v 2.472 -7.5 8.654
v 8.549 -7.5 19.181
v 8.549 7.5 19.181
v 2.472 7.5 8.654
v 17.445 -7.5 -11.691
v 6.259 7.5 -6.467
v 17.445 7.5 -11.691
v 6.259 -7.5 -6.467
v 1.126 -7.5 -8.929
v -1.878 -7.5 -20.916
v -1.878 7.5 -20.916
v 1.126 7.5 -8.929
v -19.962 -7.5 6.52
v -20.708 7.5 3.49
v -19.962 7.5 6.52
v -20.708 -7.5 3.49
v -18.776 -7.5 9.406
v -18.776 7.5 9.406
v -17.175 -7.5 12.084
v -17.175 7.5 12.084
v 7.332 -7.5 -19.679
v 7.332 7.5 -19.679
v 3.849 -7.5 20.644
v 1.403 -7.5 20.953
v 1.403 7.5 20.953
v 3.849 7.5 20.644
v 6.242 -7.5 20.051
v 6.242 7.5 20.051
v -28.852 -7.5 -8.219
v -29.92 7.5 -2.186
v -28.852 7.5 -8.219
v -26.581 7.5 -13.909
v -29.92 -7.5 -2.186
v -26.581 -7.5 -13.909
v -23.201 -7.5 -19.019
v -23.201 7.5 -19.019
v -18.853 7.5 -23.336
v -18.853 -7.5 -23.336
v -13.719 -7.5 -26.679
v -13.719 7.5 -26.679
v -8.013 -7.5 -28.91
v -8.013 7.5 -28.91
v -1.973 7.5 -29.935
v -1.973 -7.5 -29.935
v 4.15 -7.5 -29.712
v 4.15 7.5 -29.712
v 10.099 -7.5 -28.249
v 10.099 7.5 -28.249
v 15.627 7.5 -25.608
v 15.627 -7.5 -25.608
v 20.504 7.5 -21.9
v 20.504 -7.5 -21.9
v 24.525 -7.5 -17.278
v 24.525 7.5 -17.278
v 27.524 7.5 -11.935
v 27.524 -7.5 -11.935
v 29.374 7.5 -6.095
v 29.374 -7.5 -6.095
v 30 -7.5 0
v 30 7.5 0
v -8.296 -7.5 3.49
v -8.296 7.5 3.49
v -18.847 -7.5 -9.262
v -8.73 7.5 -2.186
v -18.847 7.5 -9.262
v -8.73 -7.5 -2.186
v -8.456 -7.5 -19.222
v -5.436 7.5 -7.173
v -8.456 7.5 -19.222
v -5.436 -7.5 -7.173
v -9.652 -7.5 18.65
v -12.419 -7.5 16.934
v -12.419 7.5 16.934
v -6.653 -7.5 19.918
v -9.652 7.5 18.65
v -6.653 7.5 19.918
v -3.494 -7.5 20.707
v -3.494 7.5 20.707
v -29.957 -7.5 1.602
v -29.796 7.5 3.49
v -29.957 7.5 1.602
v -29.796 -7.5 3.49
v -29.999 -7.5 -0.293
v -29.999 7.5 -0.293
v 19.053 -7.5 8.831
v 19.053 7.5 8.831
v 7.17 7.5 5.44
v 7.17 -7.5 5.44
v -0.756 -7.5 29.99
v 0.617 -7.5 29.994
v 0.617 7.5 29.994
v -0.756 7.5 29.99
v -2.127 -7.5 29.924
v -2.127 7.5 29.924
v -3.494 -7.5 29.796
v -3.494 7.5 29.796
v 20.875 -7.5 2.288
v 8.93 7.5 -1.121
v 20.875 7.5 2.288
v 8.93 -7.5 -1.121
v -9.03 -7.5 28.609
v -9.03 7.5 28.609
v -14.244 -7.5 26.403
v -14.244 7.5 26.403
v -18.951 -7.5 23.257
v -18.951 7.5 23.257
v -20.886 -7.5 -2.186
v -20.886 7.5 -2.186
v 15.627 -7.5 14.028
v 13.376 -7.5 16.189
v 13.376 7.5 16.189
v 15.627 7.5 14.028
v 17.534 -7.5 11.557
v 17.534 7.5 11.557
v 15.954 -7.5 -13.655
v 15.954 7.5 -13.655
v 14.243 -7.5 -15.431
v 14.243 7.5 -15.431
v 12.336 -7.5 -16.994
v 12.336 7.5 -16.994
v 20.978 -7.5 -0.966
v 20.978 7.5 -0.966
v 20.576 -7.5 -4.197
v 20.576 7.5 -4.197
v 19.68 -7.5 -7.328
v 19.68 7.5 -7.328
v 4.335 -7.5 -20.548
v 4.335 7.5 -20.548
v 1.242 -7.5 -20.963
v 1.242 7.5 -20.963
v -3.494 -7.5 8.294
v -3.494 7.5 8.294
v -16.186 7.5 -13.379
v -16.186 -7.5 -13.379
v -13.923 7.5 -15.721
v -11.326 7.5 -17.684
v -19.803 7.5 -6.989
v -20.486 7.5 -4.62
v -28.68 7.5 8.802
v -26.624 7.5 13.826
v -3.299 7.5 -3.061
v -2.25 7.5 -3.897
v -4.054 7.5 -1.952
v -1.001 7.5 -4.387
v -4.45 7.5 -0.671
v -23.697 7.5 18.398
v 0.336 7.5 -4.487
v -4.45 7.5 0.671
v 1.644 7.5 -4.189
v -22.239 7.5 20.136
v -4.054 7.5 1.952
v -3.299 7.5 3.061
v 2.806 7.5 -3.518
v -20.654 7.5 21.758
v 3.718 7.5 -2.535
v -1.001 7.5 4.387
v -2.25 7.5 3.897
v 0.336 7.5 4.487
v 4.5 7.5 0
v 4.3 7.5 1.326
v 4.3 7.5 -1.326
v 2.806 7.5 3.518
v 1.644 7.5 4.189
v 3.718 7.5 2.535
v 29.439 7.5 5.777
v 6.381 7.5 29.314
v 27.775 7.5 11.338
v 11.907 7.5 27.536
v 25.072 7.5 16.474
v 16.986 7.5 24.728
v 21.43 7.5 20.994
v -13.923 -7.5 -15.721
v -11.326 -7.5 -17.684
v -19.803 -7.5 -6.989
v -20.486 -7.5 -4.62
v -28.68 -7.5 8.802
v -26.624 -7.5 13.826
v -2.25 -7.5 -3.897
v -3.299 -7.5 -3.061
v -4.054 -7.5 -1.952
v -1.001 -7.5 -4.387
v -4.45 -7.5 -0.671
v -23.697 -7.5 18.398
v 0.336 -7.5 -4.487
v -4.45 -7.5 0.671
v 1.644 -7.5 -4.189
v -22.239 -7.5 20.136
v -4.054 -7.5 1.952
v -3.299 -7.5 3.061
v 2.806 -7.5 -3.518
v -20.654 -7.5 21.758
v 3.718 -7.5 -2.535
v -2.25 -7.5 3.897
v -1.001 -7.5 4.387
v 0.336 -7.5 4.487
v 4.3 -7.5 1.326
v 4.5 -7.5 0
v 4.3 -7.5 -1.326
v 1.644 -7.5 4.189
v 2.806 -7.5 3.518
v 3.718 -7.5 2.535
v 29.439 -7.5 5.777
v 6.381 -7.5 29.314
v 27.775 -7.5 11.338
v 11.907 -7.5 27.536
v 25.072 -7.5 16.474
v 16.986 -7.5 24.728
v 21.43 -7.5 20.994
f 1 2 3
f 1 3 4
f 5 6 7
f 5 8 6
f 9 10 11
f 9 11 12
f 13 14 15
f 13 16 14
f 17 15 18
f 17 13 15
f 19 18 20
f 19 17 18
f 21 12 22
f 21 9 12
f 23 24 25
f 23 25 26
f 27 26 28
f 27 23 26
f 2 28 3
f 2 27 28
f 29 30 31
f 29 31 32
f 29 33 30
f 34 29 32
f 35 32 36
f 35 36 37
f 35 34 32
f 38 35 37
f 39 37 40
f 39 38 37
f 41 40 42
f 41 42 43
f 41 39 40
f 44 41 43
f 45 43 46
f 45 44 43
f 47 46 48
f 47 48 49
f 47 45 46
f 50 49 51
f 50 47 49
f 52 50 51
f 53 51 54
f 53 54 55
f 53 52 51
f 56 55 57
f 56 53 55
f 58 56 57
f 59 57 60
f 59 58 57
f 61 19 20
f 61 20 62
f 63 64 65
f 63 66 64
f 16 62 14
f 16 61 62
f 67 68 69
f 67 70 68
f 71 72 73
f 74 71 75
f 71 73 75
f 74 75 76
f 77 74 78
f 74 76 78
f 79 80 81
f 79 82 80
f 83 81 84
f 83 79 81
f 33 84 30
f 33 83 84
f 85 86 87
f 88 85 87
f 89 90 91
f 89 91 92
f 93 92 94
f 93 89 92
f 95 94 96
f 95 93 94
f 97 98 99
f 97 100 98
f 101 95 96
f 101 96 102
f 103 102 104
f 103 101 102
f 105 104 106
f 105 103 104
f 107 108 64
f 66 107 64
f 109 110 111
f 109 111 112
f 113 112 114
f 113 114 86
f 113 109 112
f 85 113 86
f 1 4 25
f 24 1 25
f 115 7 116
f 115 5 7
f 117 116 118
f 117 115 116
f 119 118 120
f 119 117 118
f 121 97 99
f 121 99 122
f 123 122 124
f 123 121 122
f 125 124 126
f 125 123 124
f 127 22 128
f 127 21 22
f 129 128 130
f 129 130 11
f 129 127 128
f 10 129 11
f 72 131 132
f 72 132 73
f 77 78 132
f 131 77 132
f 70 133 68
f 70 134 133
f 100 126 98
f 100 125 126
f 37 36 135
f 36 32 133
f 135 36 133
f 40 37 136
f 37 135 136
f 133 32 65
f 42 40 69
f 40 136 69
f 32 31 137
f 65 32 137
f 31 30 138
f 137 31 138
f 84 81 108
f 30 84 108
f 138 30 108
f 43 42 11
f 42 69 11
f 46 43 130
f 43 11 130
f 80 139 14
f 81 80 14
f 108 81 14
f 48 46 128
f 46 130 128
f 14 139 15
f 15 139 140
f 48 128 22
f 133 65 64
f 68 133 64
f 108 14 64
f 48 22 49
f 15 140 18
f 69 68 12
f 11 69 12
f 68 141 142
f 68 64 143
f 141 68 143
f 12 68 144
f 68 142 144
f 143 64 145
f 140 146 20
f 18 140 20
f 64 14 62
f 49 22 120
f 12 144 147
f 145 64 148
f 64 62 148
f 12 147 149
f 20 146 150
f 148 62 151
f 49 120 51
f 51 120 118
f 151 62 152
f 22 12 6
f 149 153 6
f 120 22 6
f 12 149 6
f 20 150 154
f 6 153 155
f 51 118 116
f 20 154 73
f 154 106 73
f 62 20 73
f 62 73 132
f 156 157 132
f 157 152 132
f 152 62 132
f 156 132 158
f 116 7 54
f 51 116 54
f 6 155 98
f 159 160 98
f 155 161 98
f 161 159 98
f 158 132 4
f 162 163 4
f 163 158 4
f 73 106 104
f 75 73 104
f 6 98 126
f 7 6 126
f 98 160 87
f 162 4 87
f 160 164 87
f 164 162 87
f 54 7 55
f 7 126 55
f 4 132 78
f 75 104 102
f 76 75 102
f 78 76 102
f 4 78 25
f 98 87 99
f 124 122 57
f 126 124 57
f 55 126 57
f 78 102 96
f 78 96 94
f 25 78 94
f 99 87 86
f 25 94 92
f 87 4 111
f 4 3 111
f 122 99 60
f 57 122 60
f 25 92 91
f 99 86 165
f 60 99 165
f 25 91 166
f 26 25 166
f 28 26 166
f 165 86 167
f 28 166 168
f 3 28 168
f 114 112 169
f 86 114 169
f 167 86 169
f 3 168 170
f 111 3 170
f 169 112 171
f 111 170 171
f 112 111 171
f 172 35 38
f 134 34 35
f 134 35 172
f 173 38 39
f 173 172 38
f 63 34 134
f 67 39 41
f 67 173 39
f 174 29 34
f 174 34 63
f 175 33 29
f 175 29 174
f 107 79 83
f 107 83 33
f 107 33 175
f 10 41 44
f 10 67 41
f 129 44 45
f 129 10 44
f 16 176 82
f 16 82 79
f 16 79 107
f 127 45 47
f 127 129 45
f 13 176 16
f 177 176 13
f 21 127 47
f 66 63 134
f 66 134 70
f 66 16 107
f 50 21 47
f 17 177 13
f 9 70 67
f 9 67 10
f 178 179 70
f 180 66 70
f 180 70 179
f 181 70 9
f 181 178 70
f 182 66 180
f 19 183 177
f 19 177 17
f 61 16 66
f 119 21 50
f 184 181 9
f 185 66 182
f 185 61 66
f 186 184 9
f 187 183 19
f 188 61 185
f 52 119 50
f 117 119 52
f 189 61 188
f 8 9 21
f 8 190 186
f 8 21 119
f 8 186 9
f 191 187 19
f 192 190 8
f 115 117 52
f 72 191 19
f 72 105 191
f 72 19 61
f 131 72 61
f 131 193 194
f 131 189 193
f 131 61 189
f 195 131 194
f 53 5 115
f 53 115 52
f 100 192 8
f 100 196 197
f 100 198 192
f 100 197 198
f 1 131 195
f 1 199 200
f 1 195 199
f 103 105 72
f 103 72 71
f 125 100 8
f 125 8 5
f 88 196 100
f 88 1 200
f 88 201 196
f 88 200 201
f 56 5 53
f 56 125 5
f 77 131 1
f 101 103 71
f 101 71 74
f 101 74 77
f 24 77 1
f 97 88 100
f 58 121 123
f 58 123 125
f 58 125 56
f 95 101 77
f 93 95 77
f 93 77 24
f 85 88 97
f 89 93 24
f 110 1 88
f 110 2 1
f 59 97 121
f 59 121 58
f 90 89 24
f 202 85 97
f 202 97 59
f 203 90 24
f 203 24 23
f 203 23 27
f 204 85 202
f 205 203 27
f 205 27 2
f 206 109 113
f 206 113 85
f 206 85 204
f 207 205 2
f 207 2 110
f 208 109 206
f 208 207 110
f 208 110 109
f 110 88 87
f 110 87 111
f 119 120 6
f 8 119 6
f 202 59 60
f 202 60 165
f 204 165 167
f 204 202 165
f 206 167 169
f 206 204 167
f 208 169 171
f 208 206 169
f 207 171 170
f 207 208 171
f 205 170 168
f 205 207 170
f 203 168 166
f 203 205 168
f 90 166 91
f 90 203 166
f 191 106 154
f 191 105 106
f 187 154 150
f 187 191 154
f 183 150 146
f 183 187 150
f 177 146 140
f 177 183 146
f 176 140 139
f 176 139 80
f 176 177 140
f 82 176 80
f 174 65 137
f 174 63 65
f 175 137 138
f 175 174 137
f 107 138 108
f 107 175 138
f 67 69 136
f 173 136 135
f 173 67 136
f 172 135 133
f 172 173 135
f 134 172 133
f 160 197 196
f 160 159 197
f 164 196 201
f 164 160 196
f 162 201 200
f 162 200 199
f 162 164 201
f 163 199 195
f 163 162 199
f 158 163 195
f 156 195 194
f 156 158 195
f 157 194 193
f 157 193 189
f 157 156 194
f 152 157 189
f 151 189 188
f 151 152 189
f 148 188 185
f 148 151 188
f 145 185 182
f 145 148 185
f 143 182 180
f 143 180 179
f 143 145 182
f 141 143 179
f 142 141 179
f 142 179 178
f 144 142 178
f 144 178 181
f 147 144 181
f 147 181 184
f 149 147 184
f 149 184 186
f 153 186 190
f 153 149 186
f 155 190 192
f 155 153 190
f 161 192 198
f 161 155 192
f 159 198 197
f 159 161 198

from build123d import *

# Parameters (mm, degrees)
F0_R     = 4.5
F1_DEPTH = 7.5


with BuildPart() as f1:
    # F0 (on Front) → F1 (new body, symmetric)
    with BuildSketch(Plane.XZ):
        with BuildLine():
            ThreePointArc((-29.920215, -2.18649), (1.093972, -29.980047), (30, 0))
            ThreePointArc((30, 0), (21.430167, 20.993997), (0.616805, 29.993659))
            ThreePointArc((0.616805, 29.993659), (-1.441951, 29.965326), (-3.493914, 29.795848))
            ThreePointArc((-3.493914, 29.795848), (-11.688943, 27.629126), (-18.950763, 23.256582))
            ThreePointArc((-18.950763, 23.256582), (-21.461585, 20.961879), (-23.696509, 18.397703))
            ThreePointArc((-23.696509, 18.397703), (-27.765689, 11.360745), (-29.796343, 3.489695))
            ThreePointArc((-29.796343, 3.489695), (-29.992859, 0.654539), (-29.920215, -2.18649))
        make_face()
        with BuildLine():
            ThreePointArc((-8.455649, -19.222435), (-12.662502, -16.752941), (-16.186097, -13.379472))
            Line((-16.186097, -13.379472), (-5.435969, -7.172883))
            Line((-5.435969, -7.172883), (-8.455649, -19.222435))
        make_face(mode=Mode.SUBTRACT)
        with BuildLine():
            Line((-20.885863, -2.18649), (-8.730364, -2.18649))
            Line((-8.730364, -2.18649), (-18.847223, -9.261867))
            ThreePointArc((-18.847223, -9.261867), (-20.179068, -5.814227), (-20.885863, -2.18649))
        make_face(mode=Mode.SUBTRACT)
        with BuildLine():
            Line((-1.8781, -20.915849), (1.125788, -8.929311))
            Line((1.125788, -8.929311), (7.331845, -19.678517))
            ThreePointArc((7.331845, -19.678517), (2.796173, -20.813011), (-1.8781, -20.915849))
        make_face(mode=Mode.SUBTRACT)
        with BuildLine():
            Line((12.336487, -16.994443), (6.258738, -6.467473))
            Line((6.258738, -6.467473), (17.444624, -11.69124))
            ThreePointArc((17.444624, -11.69124), (15.124802, -14.568472), (12.336487, -16.994443))
        make_face(mode=Mode.SUBTRACT)
        with BuildLine():
            ThreePointArc((20.874941, 2.288411), (20.839724, -2.589578), (19.680011, -7.327835))
            Line((19.680011, -7.327835), (8.929883, -1.121246))
            Line((8.929883, -1.121246), (20.874941, 2.288411))
        make_face(mode=Mode.SUBTRACT)
        with BuildLine():
            Line((-17.174607, 12.084407), (-8.295904, 3.489695))
            Line((-8.295904, 3.489695), (-20.708019, 3.489695))
            ThreePointArc((-20.708019, 3.489695), (-19.422682, 7.984949), (-17.174607, 12.084407))
        make_face(mode=Mode.SUBTRACT)
        with BuildLine():
            ThreePointArc((-12.419293, 16.934024), (-8.177222, 19.342519), (-3.493914, 20.707307))
            Line((-3.493914, 20.707307), (-3.493914, 8.294128))
            Line((-3.493914, 8.294128), (-12.419293, 16.934024))
        make_face(mode=Mode.SUBTRACT)
        Circle(F0_R, mode=Mode.SUBTRACT)
        with BuildLine():
            Line((2.471627, 8.653962), (1.402599, 20.953108))
            ThreePointArc((1.402599, 20.953108), (5.054266, 20.382699), (8.549376, 19.180933))
            Line((8.549376, 19.180933), (2.471627, 8.653962))
        make_face(mode=Mode.SUBTRACT)
        with BuildLine():
            Line((19.052707, 8.831442), (7.170116, 5.439617))
            Line((7.170116, 5.439617), (13.376173, 16.188823))
            ThreePointArc((13.376173, 16.188823), (16.62651, 12.828062), (19.052707, 8.831442))
        make_face(mode=Mode.SUBTRACT)
    extrude(amount=F1_DEPTH, both=True)


solid = f1.part
